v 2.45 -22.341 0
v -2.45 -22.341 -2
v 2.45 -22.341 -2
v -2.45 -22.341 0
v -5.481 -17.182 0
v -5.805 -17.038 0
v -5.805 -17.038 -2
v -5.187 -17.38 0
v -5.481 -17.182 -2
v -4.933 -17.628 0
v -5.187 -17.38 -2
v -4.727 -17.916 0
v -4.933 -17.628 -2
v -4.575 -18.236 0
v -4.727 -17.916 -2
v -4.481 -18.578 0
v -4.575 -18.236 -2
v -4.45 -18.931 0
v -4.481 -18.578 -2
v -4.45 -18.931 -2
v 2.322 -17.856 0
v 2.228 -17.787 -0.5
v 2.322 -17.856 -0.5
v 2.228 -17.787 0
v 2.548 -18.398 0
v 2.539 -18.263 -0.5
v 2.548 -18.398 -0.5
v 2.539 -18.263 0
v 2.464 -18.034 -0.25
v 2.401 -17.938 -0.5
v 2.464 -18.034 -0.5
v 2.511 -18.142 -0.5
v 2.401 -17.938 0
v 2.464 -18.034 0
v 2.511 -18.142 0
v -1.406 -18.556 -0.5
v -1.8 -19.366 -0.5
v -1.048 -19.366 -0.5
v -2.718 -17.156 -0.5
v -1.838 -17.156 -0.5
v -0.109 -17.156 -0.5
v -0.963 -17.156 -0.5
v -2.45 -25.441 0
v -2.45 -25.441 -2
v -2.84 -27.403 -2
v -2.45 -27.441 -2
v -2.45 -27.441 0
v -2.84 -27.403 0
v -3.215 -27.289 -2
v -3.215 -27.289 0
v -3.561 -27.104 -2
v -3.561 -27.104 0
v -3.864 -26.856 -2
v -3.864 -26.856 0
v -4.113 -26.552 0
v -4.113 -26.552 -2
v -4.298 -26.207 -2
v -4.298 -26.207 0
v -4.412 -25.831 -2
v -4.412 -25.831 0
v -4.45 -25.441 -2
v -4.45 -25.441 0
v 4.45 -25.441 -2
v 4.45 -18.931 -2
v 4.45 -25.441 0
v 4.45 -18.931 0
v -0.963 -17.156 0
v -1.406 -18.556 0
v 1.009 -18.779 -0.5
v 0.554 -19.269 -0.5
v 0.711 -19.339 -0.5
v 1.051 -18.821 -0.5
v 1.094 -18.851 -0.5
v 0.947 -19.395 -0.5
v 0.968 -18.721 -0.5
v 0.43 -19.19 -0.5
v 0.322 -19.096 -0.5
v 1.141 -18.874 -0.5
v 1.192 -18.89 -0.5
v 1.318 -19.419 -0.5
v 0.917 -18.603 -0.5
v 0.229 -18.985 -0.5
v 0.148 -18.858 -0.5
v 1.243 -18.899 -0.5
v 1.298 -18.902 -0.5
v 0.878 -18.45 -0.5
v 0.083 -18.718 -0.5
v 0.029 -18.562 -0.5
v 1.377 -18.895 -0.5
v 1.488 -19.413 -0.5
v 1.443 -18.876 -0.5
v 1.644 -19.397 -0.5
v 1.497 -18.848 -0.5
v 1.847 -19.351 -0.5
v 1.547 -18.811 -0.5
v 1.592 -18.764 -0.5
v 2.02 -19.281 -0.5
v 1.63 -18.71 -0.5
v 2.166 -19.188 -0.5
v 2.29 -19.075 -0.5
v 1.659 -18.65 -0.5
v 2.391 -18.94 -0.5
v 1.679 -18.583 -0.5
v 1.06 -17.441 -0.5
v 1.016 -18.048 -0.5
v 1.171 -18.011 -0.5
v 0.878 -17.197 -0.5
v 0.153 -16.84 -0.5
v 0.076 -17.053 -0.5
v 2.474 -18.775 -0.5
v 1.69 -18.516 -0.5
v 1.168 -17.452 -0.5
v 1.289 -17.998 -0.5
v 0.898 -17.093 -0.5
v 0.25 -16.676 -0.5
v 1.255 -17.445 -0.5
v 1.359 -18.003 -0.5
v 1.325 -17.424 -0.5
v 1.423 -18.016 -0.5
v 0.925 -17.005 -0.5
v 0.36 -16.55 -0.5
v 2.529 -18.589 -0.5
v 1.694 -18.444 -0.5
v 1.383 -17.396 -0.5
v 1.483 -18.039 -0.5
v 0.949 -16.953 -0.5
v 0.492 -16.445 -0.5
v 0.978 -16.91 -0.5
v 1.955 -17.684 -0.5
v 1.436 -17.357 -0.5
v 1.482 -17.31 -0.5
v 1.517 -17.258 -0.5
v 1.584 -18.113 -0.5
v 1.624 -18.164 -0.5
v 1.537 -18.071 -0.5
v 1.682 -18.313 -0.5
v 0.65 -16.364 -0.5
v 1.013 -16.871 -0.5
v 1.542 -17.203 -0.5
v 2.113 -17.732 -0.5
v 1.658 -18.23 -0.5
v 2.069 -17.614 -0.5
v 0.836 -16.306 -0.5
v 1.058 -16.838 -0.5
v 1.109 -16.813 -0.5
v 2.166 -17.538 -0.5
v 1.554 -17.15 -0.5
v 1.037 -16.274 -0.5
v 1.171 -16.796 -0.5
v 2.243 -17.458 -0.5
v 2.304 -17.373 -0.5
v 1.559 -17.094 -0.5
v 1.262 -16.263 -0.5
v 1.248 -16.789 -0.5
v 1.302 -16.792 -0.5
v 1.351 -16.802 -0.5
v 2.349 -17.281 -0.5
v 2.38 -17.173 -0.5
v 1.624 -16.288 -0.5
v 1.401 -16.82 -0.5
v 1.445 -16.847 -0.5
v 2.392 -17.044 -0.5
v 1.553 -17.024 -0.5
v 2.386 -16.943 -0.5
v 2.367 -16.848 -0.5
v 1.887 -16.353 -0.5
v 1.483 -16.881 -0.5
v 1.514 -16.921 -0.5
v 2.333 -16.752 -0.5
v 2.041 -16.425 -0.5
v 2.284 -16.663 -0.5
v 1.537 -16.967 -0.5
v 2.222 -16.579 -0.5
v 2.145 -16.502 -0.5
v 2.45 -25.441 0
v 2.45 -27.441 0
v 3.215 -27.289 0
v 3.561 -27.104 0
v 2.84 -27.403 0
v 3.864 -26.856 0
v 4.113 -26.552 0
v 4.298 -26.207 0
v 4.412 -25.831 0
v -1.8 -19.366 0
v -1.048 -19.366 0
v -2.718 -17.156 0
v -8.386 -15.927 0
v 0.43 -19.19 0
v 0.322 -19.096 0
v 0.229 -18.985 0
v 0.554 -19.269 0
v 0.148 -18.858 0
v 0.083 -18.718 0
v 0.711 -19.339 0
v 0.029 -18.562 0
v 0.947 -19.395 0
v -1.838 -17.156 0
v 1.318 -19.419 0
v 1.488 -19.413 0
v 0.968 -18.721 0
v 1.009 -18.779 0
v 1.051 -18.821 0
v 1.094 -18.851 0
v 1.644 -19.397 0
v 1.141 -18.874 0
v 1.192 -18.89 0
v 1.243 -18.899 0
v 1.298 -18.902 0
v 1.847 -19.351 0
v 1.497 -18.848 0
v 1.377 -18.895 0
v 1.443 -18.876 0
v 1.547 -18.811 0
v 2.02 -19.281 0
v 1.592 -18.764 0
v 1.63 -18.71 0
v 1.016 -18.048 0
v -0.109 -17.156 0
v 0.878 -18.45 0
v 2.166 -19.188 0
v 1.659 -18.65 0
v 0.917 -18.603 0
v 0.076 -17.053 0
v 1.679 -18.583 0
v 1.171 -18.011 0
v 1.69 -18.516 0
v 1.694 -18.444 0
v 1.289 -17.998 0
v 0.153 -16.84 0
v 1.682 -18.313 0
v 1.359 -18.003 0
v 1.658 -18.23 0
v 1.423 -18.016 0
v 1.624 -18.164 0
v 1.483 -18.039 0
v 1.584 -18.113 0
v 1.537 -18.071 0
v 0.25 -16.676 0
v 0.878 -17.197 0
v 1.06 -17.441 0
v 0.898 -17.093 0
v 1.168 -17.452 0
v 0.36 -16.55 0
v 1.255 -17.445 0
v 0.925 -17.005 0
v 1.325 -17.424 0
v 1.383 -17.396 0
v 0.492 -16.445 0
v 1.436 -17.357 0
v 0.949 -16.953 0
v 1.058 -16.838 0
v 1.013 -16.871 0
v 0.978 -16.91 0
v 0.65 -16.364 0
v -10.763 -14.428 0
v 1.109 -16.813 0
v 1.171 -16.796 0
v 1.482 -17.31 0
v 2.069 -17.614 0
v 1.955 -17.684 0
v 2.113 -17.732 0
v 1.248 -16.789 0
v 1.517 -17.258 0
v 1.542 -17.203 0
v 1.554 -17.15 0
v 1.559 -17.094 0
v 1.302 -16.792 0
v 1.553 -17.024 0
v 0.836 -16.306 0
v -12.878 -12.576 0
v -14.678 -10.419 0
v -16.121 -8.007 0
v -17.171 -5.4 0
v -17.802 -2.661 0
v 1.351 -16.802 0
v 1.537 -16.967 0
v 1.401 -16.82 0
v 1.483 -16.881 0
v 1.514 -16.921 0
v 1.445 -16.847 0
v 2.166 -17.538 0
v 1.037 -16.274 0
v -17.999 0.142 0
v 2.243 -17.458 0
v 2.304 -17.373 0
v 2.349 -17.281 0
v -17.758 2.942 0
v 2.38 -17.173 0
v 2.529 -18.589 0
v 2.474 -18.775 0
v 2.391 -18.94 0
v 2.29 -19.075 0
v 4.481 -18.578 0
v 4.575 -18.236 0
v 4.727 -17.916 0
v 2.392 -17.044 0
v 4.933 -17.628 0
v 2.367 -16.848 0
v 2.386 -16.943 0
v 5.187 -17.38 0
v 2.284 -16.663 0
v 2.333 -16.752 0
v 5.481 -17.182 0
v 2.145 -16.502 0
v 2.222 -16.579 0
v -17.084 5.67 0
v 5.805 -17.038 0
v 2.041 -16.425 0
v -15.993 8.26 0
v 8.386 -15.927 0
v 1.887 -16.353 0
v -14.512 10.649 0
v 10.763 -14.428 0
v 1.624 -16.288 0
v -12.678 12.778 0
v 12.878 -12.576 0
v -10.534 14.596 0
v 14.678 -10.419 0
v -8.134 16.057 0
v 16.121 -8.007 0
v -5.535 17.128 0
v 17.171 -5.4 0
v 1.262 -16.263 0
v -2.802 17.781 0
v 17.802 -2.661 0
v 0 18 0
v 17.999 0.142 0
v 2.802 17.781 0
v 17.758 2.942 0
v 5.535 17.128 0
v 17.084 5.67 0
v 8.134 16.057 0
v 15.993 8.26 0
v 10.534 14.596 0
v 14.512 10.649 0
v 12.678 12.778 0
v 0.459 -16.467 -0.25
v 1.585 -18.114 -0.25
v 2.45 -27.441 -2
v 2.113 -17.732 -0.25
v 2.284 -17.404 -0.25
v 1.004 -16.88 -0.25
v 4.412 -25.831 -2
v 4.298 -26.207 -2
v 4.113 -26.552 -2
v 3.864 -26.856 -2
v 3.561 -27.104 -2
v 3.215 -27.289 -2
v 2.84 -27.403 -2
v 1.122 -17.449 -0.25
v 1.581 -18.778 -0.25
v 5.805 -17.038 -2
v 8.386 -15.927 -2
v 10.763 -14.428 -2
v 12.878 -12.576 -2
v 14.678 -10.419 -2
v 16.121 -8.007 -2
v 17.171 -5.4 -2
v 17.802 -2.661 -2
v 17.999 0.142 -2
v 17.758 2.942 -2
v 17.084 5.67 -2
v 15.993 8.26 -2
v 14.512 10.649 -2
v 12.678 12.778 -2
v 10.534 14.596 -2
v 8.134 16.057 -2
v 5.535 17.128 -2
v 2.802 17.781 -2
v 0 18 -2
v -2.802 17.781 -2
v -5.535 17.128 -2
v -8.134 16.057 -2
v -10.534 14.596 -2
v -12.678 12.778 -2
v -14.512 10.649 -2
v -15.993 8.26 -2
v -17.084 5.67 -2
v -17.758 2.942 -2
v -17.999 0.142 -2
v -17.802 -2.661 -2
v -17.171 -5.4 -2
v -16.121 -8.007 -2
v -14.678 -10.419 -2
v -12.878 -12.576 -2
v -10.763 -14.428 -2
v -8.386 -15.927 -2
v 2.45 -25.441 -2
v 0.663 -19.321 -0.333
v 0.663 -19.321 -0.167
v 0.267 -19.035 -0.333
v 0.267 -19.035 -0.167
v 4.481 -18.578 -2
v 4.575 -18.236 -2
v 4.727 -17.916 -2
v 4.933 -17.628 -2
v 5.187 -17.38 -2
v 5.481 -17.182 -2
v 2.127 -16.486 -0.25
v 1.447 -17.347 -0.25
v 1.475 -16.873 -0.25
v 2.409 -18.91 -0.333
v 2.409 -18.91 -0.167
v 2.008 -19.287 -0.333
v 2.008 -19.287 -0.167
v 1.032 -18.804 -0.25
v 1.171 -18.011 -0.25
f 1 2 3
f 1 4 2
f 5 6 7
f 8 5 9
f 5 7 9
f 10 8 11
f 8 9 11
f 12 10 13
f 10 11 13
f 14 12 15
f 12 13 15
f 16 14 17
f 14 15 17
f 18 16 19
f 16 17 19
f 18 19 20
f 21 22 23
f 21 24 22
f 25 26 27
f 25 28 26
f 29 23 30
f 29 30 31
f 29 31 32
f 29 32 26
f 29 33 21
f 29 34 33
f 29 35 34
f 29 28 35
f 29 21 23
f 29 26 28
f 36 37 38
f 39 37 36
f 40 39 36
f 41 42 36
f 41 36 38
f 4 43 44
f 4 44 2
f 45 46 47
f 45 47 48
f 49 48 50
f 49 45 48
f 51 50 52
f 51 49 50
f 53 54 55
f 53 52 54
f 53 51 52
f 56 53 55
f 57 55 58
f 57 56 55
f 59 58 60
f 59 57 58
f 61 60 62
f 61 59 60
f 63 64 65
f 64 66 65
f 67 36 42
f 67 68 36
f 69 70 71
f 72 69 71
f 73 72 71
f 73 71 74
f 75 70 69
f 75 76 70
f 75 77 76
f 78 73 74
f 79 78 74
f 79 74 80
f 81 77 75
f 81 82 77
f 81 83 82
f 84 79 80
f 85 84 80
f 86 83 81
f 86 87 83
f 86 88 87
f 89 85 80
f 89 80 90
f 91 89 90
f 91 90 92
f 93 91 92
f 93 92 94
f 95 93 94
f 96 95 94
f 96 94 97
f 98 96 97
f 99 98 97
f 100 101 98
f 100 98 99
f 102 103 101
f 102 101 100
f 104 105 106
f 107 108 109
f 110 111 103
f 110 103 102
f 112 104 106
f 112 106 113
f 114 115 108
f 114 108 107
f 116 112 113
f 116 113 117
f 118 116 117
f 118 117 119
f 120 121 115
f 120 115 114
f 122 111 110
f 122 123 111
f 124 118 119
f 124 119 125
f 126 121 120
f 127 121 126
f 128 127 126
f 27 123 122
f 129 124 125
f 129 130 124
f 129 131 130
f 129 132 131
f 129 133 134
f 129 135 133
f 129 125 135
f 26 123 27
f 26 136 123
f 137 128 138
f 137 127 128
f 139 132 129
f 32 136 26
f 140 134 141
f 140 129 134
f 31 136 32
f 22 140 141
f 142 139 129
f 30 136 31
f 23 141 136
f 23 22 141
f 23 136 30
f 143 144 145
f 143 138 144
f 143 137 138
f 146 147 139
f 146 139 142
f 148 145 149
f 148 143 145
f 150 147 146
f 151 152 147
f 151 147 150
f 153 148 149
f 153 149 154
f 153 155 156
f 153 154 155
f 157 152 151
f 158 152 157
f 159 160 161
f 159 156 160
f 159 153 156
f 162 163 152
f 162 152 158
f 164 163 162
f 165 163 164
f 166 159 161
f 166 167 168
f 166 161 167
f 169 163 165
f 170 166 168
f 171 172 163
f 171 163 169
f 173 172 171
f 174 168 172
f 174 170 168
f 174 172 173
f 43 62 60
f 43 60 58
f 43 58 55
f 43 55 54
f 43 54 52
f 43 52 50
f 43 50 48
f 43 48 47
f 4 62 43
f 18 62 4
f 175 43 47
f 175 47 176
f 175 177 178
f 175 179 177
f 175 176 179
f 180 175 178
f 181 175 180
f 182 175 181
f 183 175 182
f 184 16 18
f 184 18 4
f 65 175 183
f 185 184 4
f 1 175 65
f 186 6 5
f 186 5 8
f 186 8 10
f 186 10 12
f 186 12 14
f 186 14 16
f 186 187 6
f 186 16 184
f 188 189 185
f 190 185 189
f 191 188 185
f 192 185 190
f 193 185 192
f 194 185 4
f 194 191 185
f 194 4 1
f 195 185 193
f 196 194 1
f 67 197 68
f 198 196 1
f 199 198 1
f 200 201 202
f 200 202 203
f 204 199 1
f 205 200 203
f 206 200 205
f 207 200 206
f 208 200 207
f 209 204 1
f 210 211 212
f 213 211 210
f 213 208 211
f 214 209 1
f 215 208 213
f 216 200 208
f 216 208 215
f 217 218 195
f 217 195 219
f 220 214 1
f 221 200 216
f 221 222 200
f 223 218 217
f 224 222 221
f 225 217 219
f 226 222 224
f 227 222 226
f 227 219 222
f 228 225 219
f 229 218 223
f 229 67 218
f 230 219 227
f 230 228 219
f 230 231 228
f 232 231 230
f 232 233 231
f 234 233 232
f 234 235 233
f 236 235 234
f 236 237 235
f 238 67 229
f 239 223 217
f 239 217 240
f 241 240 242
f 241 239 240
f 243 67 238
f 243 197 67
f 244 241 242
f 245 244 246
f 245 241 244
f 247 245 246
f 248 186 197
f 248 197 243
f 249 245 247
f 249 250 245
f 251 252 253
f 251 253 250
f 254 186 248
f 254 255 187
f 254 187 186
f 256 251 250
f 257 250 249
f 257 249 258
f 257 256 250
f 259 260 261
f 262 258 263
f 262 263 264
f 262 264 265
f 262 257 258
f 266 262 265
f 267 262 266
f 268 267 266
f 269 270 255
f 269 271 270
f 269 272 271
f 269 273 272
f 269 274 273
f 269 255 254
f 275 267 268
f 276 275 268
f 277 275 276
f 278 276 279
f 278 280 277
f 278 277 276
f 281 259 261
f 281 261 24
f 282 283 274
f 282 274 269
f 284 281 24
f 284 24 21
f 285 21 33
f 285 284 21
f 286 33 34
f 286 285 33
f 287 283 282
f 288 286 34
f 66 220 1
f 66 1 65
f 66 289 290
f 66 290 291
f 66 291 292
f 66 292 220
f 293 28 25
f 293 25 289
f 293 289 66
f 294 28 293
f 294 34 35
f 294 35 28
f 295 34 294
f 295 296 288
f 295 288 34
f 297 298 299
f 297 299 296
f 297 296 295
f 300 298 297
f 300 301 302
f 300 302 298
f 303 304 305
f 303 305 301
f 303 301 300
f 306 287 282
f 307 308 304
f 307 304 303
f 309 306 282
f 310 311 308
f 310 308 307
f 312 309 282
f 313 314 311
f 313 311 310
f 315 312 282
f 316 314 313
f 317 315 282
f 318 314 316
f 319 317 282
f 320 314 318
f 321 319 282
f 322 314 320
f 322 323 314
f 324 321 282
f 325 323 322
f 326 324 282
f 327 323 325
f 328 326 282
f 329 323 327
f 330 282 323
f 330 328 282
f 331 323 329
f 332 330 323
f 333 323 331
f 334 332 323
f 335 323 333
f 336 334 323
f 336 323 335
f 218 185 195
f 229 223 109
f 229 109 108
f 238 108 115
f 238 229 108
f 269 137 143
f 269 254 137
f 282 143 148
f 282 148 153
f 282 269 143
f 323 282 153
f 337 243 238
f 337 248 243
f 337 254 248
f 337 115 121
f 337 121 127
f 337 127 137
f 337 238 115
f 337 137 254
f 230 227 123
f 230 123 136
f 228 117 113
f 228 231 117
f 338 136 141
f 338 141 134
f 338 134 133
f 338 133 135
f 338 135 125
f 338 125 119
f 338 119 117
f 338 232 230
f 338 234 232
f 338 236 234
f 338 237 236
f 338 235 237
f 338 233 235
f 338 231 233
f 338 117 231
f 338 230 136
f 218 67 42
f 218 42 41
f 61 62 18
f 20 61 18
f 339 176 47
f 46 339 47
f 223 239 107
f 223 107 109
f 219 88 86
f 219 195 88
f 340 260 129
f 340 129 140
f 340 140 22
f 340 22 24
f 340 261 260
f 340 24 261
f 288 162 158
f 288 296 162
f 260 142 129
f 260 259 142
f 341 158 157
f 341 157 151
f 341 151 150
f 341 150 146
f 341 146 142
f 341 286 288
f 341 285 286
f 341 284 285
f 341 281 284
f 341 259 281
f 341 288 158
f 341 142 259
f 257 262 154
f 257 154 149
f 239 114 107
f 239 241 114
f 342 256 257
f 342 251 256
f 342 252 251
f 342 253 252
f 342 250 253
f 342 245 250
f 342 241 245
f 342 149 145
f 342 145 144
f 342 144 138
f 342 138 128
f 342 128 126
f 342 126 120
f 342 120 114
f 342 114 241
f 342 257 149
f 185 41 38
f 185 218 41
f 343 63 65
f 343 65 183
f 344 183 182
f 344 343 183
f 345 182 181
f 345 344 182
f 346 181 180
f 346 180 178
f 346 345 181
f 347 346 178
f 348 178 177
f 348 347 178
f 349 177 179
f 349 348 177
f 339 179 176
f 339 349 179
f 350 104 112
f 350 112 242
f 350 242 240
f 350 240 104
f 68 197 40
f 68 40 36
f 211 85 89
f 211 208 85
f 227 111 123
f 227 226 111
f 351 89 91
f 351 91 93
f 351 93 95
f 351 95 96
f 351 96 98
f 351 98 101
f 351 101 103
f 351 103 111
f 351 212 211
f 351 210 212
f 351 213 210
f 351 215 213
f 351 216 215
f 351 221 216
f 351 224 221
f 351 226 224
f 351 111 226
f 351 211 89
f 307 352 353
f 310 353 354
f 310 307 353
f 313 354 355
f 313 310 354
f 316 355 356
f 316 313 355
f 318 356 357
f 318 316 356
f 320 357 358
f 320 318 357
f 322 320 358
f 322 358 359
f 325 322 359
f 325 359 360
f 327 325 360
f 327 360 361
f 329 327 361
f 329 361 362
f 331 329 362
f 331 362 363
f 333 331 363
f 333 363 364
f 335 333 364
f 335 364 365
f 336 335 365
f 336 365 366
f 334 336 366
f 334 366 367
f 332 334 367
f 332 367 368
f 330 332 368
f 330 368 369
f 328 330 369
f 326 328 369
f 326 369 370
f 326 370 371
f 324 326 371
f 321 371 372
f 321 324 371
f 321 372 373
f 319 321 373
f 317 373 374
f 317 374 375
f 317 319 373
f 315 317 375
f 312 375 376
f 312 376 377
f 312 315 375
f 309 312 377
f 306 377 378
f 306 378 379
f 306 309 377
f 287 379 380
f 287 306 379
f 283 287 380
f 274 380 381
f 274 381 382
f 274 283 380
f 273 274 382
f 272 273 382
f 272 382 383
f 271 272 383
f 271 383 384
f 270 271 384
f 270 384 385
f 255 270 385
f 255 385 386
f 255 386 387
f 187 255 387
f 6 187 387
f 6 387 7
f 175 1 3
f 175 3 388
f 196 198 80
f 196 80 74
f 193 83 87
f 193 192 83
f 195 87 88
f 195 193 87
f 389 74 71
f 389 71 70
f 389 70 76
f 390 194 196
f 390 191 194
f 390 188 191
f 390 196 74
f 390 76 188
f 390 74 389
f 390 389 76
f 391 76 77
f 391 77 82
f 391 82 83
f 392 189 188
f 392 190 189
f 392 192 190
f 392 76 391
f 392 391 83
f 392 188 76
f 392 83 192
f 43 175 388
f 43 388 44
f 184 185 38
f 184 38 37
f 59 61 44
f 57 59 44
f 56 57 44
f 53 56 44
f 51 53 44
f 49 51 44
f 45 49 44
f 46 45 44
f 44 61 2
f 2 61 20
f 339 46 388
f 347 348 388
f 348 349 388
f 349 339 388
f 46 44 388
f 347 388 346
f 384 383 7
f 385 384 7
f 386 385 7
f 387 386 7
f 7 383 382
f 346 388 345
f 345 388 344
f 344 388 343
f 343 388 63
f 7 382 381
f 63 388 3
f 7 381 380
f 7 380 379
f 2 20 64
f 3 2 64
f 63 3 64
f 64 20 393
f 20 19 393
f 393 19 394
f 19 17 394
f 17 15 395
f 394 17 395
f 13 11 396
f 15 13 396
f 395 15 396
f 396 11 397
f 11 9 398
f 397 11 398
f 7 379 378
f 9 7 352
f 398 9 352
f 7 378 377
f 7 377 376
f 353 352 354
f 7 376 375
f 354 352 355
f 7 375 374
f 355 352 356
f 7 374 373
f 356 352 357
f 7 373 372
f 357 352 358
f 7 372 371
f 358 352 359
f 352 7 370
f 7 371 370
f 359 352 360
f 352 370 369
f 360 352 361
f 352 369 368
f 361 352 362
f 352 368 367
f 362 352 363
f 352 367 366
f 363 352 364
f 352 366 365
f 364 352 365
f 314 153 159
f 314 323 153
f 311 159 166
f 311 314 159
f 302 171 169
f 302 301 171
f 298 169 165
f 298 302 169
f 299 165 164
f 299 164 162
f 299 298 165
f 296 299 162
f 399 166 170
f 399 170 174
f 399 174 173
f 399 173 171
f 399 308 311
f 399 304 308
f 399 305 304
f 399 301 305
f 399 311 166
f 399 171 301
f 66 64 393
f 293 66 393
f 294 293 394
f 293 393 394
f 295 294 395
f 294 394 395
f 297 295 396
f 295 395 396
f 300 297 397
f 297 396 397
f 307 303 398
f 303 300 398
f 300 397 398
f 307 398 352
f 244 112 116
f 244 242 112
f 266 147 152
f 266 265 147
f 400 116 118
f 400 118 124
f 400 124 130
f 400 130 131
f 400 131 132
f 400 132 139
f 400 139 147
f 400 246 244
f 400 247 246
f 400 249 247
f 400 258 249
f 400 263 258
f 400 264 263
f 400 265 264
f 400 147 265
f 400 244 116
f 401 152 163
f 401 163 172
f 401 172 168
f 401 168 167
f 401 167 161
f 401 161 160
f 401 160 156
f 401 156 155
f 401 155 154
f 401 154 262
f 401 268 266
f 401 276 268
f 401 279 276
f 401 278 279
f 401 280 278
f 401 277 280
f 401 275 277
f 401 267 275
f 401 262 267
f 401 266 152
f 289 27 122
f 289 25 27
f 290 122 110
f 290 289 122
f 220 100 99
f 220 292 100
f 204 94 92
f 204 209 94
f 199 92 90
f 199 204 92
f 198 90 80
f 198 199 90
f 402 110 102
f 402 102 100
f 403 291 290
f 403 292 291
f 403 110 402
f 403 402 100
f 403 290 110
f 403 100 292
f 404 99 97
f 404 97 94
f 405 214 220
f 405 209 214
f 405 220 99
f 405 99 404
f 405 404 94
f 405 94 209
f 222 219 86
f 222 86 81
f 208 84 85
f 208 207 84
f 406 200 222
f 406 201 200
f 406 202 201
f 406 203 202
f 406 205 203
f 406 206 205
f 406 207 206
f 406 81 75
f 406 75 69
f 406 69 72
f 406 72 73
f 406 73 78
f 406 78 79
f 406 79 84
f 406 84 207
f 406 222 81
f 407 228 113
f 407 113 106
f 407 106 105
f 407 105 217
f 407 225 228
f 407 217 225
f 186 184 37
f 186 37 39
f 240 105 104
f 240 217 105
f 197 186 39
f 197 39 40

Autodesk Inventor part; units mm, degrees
ref_plane "YZ Plane" through (0, 0, 0) normal (1, 0, 0) x (0, 1, 0)
ref_plane "XZ Plane" through (0, 0, 0) normal (0, 1, 0) x (-1, 0, 0)
ref_plane "XY Plane" through (0, 0, 0) normal (0, 0, 1) x (1, 0, 0)
sketch "Sketch1: base" plane through (0, 0, 0) normal (0, 0, 1) x (1, 0, 0)
  circle A0 centre (0, 0) radius 18
  line L0 (4.45, -17.4413) -> (4.45, -27.4413)
  line L1 (4.45, -27.4413) -> (-4.45, -27.4413)
  line L2 (-4.45, -27.4413) -> (-4.45, -17.4413)
  line L3 (-2.45, -22.3413) -> (2.45, -22.3413)
  line L4 (2.45, -22.3413) -> (2.45, -25.4413)
  line L5 (2.45, -25.4413) -> (-2.45, -25.4413)
  line L6 (-2.45, -25.4413) -> (-2.45, -22.3413)
  line L7 (-2, -22.2913) -> (2, -22.2913) construction
  line L8 (2, -25.4913) -> (-2, -25.4913) construction
  arc A1 (-2, -22.2913) -> (-2, -25.4913) centre (-0.0791, -23.8913) ccw construction
  arc A2 (2, -25.4913) -> (2, -22.2913) centre (0.0791, -23.8913) ccw construction
  point P0 (0, -22.3413)
  point P1 (0, -27.4413)
  point P2 (0, -22.2913)
  point P3 (-2.45, -23.8913)
  dimension "door_diameter" = 36
  dimension "axle_width" = 4.9
  dimension "axle_height" = 3.1
  dimension "handle_height" = 10
  dimension "spacing_height" = 2
  dimension "spacing_width" = 2
  dimension "d14" = 4
  dimension "d16" = 3.2
  dimension "d17" = 2.5
sketch "Sketch2: text" plane through (0, 0, 0) normal (0, 0, 1) x (1, 0, 0)
  line L0 (-1.5, -16.3413) -> (1.5, -16.3413) construction
  line L1 (1.5, -16.3413) -> (1.5, -19.3413) construction
  line L2 (1.5, -19.3413) -> (-1.5, -19.3413) construction
  line L3 (-1.5, -19.3413) -> (-1.5, -16.3413) construction
  line L4 (4.45, -27.4413) -> (-4.45, -27.4413) construction
  line L5 (-4.45, -27.4413) -> (-4.45, -17.4413) construction
  line L6 (4.45, -17.4413) -> (4.45, -27.4413) construction
  line L7 (-2.45, -22.3413) -> (2.45, -22.3413) construction
  line L8 (2.45, -22.3413) -> (2.45, -25.4413) construction
  line L9 (-2.45, -25.4413) -> (-2.45, -22.3413) construction
  line L10 (2.45, -25.4413) -> (-2.45, -25.4413) construction
  circle A0 centre (0, 0) radius 18 construction
  line L11 (-2.7183, -17.1558) -> (-1.8376, -17.1558)
  line L12 (-1.8376, -17.1558) -> (-1.4061, -18.5561)
  line L13 (-1.4061, -18.5561) -> (-0.9628, -17.1558)
  line L14 (-0.9628, -17.1558) -> (-0.1086, -17.1558)
  line L15 (-0.1086, -17.1558) -> (-1.048, -19.3663)
  line L16 (-1.048, -19.3663) -> (-1.7995, -19.3663)
  line L17 (-1.7995, -19.3663) -> (-2.7183, -17.1558)
  line L18 (0.8777, -17.1969) -> (0.0763, -17.0531)
  spline S0 degree 2 poles (0.0763, -17.0531) (0.1761, -16.6715) (0.7427, -16.2634) (1.2623, -16.2634) knots 0 0 0 1 2 2 2
  spline S1 degree 2 poles (1.2623, -16.2634) (1.8611, -16.2634) (2.3924, -16.7096) (2.3924, -17.0443) knots 0 0 0 1 2 2 2
  spline S2 degree 2 poles (2.3924, -17.0443) (2.3924, -17.2439) (2.1752, -17.5639) (1.9551, -17.6842) knots 0 0 0 1 2 2 2
  spline S3 degree 2 poles (1.9551, -17.6842) (2.1341, -17.7282) (2.2281, -17.787) knots 0 0 0 1 1 1
  spline S4 degree 2 poles (2.2281, -17.787) (2.3807, -17.8809) (2.548, -18.1862) (2.548, -18.3975) knots 0 0 0 1 2 2 2
  spline S5 degree 2 poles (2.548, -18.3975) (2.548, -18.6647) (2.2692, -19.1549) (1.7466, -19.4191) (1.318, -19.4191) knots 0 0 0 1 2 3 3 3
  spline S6 degree 2 poles (1.318, -19.4191) (0.9041, -19.4191) (0.4227, -19.2224) (0.1115, -18.8467) (0.0294, -18.5619) knots 0 0 0 1 2 3 3 3
  line L19 (0.0294, -18.5619) -> (0.8777, -18.4504)
  spline S7 degree 2 poles (0.8777, -18.4504) (0.9276, -18.7058) (1.136, -18.9024) (1.2975, -18.9024) knots 0 0 0 1 2 2 2
  spline S8 degree 2 poles (1.2975, -18.9024) (1.4678, -18.9024) (1.6938, -18.6529) (1.6938, -18.4445) knots 0 0 0 1 2 2 2
  spline S9 degree 2 poles (1.6938, -18.4445) (1.6938, -18.2302) (1.4766, -17.9983) (1.2887, -17.9983) knots 0 0 0 1 2 2 2
  spline S10 degree 2 poles (1.2887, -17.9983) (1.1889, -17.9983) (1.0157, -18.0482) knots 0 0 0 1 1 1
  line L20 (1.0157, -18.0482) -> (1.0597, -17.4406)
  spline S11 degree 2 poles (1.0597, -17.4406) (1.1302, -17.4523) (1.1683, -17.4523) knots 0 0 0 1 1 1
  spline S12 degree 2 poles (1.1683, -17.4523) (1.3357, -17.4523) (1.5588, -17.2409) (1.5588, -17.0942) knots 0 0 0 1 2 2 2
  spline S13 degree 2 poles (1.5588, -17.0942) (1.5588, -16.9562) (1.3914, -16.7889) (1.2476, -16.7889) knots 0 0 0 1 2 2 2
  spline S14 degree 2 poles (1.2476, -16.7889) (1.0979, -16.7889) (0.91, -16.9709) (0.8777, -17.1969) knots 0 0 0 1 2 2 2
  point P0 (0, -19.3413)
  point P1 (0, -22.3413)
  dimension "x_t2" = 3
  dimension "x_t3" = 3
extrude "Ex1: base" add sketch "Sketch1: base" against normal blind 2
extrude "Ex2: text" cut sketch "Sketch2: text" against normal blind 0.5
fillet "Fillet1" radius 2 4 edges at (4.45, -17.4413, -1) (-4.45, -17.4413, -1) (4.45, -27.4413, -1) (-4.45, -27.4413, -1)
fillet "Fillet2" [suppressed]
properties part number "door_03"
